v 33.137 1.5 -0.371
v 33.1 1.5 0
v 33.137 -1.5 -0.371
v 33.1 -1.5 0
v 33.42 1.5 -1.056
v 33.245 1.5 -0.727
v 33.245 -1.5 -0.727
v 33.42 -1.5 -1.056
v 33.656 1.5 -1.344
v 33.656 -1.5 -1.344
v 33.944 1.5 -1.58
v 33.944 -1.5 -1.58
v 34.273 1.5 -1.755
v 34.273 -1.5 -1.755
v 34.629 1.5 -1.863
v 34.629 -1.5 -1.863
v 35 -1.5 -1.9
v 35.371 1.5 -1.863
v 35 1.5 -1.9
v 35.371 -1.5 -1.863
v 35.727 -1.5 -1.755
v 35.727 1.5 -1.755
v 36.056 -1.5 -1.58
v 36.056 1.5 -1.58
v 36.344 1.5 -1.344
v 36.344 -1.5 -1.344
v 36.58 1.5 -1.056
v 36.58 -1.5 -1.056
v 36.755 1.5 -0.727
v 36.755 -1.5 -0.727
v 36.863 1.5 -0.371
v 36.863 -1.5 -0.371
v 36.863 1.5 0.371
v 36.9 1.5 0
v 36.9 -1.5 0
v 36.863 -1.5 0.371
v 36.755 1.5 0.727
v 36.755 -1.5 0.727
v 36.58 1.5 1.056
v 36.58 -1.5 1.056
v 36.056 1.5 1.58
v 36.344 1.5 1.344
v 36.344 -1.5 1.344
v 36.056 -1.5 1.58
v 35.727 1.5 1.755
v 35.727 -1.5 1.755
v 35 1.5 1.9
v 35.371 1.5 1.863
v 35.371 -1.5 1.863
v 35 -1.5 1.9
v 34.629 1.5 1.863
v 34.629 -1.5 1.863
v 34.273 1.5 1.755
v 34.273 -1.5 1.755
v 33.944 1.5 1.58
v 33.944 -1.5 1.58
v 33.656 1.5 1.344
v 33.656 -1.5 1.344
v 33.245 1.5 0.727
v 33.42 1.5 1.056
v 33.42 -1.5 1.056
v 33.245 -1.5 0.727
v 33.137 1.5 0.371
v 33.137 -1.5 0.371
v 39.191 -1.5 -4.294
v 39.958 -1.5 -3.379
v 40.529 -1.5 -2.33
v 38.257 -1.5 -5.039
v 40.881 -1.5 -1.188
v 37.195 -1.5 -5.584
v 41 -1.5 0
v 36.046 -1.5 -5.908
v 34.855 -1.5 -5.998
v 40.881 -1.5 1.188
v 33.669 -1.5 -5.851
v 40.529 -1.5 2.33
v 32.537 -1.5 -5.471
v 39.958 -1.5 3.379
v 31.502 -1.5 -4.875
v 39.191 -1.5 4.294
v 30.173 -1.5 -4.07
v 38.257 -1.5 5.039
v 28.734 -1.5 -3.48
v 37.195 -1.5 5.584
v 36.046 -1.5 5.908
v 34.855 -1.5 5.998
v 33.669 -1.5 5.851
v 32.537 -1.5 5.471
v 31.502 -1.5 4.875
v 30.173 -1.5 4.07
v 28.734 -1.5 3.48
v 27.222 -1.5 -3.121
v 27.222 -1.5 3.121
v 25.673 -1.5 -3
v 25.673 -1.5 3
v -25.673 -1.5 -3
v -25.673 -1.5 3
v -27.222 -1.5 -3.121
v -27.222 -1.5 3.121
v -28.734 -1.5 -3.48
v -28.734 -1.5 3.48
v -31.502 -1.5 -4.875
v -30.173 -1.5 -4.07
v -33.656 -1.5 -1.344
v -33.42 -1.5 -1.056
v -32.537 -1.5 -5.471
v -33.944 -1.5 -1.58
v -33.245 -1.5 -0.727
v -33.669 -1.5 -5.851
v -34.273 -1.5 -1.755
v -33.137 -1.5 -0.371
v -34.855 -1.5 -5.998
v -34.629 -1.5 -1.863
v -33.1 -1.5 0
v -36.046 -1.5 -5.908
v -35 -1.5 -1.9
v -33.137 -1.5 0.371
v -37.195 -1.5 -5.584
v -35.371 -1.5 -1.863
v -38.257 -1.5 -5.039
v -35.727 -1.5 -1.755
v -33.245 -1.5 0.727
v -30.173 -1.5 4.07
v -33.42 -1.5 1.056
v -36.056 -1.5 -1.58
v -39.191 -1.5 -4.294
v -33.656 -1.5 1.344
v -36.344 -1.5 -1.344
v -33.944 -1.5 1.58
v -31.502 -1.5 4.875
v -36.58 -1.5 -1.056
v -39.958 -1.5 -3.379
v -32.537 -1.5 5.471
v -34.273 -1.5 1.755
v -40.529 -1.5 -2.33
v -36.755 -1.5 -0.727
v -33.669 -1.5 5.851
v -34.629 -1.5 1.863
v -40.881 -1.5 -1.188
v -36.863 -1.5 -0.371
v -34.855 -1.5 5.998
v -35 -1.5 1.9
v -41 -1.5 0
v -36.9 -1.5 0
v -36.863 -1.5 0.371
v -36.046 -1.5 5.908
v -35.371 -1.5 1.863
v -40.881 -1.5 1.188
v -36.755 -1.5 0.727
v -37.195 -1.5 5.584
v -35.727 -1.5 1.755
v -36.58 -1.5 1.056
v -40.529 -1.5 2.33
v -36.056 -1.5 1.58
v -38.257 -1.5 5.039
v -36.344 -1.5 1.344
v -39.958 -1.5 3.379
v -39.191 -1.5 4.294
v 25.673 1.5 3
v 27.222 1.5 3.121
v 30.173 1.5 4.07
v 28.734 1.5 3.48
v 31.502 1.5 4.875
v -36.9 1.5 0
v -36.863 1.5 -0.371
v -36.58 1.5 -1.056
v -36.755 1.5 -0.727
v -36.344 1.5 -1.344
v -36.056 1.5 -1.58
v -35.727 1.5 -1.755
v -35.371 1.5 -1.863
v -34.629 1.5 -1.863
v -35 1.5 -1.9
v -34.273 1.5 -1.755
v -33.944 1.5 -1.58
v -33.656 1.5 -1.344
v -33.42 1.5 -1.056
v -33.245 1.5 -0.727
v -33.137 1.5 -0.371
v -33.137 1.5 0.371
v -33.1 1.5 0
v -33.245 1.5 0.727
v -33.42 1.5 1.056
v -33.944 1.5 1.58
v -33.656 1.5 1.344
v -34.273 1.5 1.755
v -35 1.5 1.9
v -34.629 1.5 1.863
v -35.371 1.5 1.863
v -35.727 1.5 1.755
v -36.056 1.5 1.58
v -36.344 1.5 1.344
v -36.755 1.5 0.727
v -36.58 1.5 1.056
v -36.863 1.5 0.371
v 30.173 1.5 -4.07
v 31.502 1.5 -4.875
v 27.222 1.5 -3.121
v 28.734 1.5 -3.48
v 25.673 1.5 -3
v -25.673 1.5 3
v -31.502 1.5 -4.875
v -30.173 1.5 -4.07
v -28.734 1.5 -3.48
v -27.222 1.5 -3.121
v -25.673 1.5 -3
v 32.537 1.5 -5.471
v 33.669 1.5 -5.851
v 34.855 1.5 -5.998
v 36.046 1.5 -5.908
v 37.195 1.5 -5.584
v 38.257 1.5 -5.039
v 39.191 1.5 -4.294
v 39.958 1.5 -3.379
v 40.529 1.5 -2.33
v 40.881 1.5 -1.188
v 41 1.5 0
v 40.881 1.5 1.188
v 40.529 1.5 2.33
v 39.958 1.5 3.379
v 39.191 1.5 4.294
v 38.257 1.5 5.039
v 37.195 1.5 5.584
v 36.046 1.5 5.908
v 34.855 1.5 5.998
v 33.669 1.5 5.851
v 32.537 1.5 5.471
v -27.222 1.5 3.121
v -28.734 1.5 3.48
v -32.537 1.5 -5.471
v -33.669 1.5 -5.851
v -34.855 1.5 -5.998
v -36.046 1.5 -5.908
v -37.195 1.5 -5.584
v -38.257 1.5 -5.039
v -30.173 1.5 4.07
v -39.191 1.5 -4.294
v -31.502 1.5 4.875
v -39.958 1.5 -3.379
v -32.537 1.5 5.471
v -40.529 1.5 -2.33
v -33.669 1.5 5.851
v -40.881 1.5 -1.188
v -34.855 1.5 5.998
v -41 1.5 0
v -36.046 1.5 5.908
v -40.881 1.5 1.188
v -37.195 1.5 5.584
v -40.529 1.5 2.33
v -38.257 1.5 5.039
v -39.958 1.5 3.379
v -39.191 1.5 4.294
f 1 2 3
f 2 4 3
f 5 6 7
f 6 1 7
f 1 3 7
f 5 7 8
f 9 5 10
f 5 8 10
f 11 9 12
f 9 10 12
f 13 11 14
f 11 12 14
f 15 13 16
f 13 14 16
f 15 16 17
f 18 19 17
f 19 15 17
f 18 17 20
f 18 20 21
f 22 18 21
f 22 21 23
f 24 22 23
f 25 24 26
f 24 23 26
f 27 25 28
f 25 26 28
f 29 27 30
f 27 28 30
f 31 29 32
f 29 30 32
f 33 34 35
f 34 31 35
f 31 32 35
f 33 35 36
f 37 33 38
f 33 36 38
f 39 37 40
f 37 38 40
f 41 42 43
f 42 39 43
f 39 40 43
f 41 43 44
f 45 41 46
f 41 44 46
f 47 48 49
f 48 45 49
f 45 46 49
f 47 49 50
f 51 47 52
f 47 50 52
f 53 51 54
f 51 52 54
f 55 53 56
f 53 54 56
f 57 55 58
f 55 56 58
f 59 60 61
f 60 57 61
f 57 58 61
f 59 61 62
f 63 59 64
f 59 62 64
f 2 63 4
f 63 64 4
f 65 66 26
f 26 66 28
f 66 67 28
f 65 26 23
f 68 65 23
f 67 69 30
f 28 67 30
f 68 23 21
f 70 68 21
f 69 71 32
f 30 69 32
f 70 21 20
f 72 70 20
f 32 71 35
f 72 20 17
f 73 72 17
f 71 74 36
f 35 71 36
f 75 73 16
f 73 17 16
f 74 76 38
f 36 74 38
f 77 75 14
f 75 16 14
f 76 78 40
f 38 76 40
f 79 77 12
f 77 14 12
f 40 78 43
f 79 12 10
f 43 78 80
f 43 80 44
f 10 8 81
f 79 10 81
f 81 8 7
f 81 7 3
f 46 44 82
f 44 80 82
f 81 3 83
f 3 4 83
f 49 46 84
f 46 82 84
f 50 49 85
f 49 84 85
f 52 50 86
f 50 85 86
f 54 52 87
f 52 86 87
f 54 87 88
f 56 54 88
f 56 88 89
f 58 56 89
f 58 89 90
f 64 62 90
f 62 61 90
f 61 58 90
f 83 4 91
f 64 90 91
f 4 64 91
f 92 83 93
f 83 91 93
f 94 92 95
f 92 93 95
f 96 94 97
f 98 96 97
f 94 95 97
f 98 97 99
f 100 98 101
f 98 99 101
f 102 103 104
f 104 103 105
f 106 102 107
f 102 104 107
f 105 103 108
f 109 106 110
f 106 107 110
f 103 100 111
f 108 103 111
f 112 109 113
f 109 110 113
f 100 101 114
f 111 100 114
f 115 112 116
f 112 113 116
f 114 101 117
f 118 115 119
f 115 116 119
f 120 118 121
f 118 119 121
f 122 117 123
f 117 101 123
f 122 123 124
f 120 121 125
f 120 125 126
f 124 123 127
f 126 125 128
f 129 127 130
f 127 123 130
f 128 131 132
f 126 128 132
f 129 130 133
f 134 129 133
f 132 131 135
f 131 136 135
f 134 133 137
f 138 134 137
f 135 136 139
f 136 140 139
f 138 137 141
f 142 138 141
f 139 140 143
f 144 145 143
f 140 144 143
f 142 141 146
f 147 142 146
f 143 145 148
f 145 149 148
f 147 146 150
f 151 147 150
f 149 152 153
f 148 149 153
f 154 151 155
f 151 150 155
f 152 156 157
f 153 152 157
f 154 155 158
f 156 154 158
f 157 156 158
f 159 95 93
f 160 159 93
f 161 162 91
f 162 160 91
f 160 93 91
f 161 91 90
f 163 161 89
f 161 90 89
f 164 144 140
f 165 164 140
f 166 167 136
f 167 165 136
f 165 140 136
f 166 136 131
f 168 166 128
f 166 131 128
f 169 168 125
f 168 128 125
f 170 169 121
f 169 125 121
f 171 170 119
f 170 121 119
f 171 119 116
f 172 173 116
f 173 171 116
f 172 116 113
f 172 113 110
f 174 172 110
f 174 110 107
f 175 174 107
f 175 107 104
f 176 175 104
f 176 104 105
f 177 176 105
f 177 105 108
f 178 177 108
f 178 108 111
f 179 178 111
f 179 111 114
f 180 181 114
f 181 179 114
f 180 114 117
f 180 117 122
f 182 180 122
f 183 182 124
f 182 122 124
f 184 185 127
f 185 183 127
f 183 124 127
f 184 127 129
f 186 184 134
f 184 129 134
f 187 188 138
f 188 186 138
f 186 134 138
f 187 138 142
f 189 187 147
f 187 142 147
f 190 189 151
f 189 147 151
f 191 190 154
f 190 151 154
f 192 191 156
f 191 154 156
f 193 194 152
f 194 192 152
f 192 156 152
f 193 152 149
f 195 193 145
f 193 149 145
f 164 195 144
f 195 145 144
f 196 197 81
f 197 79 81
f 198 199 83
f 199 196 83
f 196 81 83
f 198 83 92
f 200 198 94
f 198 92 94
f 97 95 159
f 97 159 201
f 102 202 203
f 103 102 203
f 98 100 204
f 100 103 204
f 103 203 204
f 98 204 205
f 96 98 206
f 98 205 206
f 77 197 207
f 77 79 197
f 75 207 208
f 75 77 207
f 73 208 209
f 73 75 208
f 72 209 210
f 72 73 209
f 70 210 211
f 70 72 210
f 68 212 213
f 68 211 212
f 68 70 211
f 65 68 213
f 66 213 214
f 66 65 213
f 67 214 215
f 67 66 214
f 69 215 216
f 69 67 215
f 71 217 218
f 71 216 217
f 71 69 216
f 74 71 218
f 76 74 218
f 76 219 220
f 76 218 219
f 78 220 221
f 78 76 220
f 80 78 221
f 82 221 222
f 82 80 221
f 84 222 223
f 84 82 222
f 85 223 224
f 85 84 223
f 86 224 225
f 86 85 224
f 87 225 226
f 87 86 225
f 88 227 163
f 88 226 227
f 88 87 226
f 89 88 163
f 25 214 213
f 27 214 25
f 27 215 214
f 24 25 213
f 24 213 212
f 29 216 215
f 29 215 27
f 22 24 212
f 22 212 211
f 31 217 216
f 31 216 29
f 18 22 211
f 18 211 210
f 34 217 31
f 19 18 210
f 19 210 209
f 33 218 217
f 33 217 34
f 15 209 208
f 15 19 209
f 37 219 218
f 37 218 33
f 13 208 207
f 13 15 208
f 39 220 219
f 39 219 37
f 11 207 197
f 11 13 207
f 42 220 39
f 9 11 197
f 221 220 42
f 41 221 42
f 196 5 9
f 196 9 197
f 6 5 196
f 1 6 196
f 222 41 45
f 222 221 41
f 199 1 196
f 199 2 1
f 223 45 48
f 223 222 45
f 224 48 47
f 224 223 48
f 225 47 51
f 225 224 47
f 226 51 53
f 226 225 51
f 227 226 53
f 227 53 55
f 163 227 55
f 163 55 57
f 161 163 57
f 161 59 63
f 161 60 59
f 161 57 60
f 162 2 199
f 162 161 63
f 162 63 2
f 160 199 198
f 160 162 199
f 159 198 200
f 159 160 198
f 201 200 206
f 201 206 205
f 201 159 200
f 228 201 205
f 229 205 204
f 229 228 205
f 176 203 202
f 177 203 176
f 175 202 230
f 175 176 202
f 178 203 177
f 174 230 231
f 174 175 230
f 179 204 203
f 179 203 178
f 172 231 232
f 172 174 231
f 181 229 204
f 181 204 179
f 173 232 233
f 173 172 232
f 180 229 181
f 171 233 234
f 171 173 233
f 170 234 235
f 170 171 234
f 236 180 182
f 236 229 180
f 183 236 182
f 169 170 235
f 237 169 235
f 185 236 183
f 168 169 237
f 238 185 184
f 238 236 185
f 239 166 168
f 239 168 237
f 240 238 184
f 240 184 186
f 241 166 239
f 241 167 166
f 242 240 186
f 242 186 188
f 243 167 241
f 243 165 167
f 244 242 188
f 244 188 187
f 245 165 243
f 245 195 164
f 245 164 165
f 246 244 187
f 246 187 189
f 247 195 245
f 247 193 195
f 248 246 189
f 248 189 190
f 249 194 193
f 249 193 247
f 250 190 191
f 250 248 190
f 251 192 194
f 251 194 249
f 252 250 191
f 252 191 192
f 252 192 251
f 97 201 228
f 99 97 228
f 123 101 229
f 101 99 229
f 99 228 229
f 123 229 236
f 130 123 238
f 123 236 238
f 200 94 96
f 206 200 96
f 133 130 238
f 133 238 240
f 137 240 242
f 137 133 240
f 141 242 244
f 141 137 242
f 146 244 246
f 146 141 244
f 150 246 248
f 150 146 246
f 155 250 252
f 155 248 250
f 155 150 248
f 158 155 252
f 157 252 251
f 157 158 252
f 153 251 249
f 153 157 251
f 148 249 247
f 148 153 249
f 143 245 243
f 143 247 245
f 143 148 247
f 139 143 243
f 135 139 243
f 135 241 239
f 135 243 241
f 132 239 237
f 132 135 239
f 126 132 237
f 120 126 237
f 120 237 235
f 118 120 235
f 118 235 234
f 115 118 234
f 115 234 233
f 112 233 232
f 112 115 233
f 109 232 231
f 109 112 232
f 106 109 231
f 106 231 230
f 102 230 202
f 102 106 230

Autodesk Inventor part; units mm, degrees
ref_plane "YZ Plane" through (0, 0, 0) normal (1, 0, 0) x (0, 1, 0)
ref_plane "XZ Plane" through (0, 0, 0) normal (0, 1, 0) x (-1, 0, 0)
ref_plane "XY Plane" through (0, 0, 0) normal (0, 0, 1) x (1, 0, 0)
sketch "Эскиз1" plane through (0, 0, 0) normal (0, 1, 0) x (-1, 0, 0)
  arc A0 (29.8038, -3) -> (29.8038, 3) centre (35, 0) ccw
  line L0 (30.0057, 0) -> (28.0258, 0)
  circle A1 centre (35, 0) radius 1.9
  arc A2 (-29.8038, 3) -> (-29.8038, -3) centre (-35, 0) ccw
  line L1 (-29.8038, -3) -> (29.8038, -3)
  line L2 (-29.8038, 3) -> (29.8038, 3)
  circle A3 centre (-35, 0) radius 1.9
  line L3 (32.9518, 0) -> (37.6343, 0) construction
  line L4 (14.11, -3) -> (14.11, 3)
  line L5 (0, -3) -> (0, 3)
  point P0 (0, 0)
  point P1 (25.2378, -3)
  point P2 (25.2378, 3)
  point P3 (0, 0)
  dimension "d2" = 6
  dimension "d3" = 35
  dimension "d4" = 3.8
  dimension "d9" = 6
extrude "Выдавливание1" add sketch "Эскиз1" along normal mid plane 3
fillet "Сопряжение1" radius 10 4 edges at (-29.8038, 0, 3) (-29.8038, 0, -3) (29.8038, 0, -3) (29.8038, 0, 3)
properties part number "Рычаг"
